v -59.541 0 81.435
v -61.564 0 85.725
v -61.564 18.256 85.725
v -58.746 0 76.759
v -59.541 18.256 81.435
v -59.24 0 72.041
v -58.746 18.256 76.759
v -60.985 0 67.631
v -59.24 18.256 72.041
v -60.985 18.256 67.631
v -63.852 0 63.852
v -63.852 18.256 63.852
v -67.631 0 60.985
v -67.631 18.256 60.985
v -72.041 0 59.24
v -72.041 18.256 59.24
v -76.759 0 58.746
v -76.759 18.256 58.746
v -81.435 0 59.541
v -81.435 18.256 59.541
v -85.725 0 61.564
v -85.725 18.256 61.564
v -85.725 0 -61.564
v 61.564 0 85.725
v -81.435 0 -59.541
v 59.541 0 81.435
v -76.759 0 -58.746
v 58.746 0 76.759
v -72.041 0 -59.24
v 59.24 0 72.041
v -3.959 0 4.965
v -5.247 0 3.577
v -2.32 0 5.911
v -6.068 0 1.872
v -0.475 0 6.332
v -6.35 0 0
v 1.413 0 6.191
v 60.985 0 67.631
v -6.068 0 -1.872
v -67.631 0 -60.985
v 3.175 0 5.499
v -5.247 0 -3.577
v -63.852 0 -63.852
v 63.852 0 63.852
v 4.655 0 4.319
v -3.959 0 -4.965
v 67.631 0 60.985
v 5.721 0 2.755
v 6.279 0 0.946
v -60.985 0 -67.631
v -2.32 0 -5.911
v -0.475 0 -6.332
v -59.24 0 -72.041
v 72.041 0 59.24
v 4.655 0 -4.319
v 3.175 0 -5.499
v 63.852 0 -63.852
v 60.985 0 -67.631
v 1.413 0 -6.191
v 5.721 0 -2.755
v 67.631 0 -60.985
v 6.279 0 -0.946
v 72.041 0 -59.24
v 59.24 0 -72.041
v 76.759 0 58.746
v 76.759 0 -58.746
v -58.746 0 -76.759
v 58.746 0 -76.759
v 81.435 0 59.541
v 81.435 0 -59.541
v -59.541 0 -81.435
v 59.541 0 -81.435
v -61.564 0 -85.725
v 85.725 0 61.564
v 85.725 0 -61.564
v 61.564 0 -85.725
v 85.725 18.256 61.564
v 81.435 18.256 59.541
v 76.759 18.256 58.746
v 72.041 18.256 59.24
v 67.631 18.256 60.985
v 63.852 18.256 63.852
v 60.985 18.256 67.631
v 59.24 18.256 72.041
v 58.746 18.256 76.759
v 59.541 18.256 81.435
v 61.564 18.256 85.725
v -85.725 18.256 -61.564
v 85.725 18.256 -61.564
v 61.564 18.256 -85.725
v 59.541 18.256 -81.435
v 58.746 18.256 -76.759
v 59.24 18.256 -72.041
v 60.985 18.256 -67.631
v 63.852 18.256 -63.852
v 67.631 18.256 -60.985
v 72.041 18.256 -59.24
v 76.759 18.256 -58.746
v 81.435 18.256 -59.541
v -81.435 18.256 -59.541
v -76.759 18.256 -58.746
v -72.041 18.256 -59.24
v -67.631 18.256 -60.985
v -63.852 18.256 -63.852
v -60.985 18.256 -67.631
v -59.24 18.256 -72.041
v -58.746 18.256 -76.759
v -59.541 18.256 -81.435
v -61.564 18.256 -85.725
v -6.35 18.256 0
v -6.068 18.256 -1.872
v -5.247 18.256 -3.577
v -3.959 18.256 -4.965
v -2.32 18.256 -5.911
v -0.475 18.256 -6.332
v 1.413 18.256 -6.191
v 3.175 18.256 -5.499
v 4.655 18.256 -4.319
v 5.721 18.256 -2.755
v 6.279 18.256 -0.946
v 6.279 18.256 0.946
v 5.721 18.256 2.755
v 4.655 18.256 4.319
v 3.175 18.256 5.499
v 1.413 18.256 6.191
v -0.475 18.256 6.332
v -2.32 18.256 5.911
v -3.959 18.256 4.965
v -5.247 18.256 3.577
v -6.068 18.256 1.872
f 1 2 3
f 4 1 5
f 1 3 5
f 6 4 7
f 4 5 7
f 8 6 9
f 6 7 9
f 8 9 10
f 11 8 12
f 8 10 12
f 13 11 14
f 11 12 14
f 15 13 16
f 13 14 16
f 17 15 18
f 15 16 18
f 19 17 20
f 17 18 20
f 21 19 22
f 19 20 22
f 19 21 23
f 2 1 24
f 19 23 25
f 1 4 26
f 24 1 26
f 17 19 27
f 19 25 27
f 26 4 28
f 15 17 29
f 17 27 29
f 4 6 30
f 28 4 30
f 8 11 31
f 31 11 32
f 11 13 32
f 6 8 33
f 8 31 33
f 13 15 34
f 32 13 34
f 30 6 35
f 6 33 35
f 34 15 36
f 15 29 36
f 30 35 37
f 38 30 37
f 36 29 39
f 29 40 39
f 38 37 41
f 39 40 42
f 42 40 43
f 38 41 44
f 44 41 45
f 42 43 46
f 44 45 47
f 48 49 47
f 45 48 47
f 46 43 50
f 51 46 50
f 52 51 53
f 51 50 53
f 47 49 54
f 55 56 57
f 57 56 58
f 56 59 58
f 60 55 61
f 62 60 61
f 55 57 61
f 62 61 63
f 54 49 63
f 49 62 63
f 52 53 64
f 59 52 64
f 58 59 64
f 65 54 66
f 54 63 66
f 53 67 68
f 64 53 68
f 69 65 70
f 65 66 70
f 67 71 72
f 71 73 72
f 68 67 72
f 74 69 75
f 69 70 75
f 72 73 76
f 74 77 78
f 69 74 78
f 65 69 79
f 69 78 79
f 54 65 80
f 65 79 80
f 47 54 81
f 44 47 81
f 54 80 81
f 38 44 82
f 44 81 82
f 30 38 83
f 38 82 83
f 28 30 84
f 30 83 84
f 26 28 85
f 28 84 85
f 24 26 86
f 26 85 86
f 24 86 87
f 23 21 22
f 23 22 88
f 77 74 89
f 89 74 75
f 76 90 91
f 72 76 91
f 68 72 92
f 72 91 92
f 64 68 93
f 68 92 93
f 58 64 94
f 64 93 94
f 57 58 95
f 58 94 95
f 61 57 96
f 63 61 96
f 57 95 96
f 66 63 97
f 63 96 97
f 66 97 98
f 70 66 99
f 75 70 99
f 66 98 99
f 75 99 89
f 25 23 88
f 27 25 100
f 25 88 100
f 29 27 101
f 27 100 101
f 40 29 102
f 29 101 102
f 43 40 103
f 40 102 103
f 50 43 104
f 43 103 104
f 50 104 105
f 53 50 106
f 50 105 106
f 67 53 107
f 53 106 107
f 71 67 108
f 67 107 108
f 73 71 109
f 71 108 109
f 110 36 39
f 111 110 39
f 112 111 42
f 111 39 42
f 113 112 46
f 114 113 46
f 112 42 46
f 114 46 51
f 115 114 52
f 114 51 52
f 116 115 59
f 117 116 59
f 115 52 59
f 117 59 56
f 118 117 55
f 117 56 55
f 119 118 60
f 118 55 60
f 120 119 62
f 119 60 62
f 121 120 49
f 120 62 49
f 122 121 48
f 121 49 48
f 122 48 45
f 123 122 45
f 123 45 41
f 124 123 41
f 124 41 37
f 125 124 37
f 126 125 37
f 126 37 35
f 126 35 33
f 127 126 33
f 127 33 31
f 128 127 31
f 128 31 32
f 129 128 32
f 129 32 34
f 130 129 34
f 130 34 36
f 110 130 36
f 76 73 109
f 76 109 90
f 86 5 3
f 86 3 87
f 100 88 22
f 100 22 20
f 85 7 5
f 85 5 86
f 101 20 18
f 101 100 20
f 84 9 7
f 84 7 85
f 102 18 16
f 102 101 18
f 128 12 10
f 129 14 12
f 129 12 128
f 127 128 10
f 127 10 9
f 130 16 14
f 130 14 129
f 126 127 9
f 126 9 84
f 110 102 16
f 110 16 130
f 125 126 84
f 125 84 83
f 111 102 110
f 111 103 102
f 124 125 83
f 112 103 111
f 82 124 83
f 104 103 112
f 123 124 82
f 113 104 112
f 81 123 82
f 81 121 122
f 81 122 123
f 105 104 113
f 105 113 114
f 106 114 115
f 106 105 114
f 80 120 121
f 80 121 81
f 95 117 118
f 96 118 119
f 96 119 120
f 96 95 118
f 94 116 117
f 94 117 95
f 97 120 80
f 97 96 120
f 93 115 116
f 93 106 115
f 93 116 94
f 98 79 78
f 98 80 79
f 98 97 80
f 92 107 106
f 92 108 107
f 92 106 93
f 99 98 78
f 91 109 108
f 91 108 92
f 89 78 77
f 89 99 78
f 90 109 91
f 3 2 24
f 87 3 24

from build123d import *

# Parameters (mm, degrees)
SKETCH1_W                  = 171.45
SKETCH1_H                  = 171.45
BOSS_EXTRUDE1_DEPTH        = 18.25625
SKETCH2_R                  = 17.4625
CUT_EXTRUDE1_DEPTH         = 123.60033407
F_1_2_0_5_DIAMETER_HOLE1_D = 12.7


with BuildPart() as part:
    # Sketch1 → Boss-Extrude1 (new body)
    with BuildSketch(Plane(origin=(0, 0, 0), x_dir=(1, 0, 0), z_dir=(0, 1, 0))):
        Rectangle(SKETCH1_W, SKETCH1_H)
    extrude(amount=BOSS_EXTRUDE1_DEPTH)

    # Sketch2 → Cut-Extrude1 (cut, through all)
    with BuildSketch(Plane(origin=(0, 18.25625, 0), x_dir=(1, 0, 0), z_dir=(0, 1, 0))):
        with Locations((-76.2, 76.2)):
            Circle(SKETCH2_R)
        with Locations((76.2, 76.2)):
            Circle(SKETCH2_R)
        with Locations((76.2, -76.2)):
            Circle(SKETCH2_R)
        with Locations((-76.2, -76.2)):
            Circle(SKETCH2_R)
    extrude(amount=-CUT_EXTRUDE1_DEPTH, mode=Mode.SUBTRACT)

    # 1/2 (0.5) Diameter Hole1 (through all)
    with Locations(Plane(origin=(0, 18.25625, 0), x_dir=(1, 0, 0), z_dir=(0, 1, 0))):
        with Locations((0, 0)):
            Hole(F_1_2_0_5_DIAMETER_HOLE1_D / 2)


solid = part.part
